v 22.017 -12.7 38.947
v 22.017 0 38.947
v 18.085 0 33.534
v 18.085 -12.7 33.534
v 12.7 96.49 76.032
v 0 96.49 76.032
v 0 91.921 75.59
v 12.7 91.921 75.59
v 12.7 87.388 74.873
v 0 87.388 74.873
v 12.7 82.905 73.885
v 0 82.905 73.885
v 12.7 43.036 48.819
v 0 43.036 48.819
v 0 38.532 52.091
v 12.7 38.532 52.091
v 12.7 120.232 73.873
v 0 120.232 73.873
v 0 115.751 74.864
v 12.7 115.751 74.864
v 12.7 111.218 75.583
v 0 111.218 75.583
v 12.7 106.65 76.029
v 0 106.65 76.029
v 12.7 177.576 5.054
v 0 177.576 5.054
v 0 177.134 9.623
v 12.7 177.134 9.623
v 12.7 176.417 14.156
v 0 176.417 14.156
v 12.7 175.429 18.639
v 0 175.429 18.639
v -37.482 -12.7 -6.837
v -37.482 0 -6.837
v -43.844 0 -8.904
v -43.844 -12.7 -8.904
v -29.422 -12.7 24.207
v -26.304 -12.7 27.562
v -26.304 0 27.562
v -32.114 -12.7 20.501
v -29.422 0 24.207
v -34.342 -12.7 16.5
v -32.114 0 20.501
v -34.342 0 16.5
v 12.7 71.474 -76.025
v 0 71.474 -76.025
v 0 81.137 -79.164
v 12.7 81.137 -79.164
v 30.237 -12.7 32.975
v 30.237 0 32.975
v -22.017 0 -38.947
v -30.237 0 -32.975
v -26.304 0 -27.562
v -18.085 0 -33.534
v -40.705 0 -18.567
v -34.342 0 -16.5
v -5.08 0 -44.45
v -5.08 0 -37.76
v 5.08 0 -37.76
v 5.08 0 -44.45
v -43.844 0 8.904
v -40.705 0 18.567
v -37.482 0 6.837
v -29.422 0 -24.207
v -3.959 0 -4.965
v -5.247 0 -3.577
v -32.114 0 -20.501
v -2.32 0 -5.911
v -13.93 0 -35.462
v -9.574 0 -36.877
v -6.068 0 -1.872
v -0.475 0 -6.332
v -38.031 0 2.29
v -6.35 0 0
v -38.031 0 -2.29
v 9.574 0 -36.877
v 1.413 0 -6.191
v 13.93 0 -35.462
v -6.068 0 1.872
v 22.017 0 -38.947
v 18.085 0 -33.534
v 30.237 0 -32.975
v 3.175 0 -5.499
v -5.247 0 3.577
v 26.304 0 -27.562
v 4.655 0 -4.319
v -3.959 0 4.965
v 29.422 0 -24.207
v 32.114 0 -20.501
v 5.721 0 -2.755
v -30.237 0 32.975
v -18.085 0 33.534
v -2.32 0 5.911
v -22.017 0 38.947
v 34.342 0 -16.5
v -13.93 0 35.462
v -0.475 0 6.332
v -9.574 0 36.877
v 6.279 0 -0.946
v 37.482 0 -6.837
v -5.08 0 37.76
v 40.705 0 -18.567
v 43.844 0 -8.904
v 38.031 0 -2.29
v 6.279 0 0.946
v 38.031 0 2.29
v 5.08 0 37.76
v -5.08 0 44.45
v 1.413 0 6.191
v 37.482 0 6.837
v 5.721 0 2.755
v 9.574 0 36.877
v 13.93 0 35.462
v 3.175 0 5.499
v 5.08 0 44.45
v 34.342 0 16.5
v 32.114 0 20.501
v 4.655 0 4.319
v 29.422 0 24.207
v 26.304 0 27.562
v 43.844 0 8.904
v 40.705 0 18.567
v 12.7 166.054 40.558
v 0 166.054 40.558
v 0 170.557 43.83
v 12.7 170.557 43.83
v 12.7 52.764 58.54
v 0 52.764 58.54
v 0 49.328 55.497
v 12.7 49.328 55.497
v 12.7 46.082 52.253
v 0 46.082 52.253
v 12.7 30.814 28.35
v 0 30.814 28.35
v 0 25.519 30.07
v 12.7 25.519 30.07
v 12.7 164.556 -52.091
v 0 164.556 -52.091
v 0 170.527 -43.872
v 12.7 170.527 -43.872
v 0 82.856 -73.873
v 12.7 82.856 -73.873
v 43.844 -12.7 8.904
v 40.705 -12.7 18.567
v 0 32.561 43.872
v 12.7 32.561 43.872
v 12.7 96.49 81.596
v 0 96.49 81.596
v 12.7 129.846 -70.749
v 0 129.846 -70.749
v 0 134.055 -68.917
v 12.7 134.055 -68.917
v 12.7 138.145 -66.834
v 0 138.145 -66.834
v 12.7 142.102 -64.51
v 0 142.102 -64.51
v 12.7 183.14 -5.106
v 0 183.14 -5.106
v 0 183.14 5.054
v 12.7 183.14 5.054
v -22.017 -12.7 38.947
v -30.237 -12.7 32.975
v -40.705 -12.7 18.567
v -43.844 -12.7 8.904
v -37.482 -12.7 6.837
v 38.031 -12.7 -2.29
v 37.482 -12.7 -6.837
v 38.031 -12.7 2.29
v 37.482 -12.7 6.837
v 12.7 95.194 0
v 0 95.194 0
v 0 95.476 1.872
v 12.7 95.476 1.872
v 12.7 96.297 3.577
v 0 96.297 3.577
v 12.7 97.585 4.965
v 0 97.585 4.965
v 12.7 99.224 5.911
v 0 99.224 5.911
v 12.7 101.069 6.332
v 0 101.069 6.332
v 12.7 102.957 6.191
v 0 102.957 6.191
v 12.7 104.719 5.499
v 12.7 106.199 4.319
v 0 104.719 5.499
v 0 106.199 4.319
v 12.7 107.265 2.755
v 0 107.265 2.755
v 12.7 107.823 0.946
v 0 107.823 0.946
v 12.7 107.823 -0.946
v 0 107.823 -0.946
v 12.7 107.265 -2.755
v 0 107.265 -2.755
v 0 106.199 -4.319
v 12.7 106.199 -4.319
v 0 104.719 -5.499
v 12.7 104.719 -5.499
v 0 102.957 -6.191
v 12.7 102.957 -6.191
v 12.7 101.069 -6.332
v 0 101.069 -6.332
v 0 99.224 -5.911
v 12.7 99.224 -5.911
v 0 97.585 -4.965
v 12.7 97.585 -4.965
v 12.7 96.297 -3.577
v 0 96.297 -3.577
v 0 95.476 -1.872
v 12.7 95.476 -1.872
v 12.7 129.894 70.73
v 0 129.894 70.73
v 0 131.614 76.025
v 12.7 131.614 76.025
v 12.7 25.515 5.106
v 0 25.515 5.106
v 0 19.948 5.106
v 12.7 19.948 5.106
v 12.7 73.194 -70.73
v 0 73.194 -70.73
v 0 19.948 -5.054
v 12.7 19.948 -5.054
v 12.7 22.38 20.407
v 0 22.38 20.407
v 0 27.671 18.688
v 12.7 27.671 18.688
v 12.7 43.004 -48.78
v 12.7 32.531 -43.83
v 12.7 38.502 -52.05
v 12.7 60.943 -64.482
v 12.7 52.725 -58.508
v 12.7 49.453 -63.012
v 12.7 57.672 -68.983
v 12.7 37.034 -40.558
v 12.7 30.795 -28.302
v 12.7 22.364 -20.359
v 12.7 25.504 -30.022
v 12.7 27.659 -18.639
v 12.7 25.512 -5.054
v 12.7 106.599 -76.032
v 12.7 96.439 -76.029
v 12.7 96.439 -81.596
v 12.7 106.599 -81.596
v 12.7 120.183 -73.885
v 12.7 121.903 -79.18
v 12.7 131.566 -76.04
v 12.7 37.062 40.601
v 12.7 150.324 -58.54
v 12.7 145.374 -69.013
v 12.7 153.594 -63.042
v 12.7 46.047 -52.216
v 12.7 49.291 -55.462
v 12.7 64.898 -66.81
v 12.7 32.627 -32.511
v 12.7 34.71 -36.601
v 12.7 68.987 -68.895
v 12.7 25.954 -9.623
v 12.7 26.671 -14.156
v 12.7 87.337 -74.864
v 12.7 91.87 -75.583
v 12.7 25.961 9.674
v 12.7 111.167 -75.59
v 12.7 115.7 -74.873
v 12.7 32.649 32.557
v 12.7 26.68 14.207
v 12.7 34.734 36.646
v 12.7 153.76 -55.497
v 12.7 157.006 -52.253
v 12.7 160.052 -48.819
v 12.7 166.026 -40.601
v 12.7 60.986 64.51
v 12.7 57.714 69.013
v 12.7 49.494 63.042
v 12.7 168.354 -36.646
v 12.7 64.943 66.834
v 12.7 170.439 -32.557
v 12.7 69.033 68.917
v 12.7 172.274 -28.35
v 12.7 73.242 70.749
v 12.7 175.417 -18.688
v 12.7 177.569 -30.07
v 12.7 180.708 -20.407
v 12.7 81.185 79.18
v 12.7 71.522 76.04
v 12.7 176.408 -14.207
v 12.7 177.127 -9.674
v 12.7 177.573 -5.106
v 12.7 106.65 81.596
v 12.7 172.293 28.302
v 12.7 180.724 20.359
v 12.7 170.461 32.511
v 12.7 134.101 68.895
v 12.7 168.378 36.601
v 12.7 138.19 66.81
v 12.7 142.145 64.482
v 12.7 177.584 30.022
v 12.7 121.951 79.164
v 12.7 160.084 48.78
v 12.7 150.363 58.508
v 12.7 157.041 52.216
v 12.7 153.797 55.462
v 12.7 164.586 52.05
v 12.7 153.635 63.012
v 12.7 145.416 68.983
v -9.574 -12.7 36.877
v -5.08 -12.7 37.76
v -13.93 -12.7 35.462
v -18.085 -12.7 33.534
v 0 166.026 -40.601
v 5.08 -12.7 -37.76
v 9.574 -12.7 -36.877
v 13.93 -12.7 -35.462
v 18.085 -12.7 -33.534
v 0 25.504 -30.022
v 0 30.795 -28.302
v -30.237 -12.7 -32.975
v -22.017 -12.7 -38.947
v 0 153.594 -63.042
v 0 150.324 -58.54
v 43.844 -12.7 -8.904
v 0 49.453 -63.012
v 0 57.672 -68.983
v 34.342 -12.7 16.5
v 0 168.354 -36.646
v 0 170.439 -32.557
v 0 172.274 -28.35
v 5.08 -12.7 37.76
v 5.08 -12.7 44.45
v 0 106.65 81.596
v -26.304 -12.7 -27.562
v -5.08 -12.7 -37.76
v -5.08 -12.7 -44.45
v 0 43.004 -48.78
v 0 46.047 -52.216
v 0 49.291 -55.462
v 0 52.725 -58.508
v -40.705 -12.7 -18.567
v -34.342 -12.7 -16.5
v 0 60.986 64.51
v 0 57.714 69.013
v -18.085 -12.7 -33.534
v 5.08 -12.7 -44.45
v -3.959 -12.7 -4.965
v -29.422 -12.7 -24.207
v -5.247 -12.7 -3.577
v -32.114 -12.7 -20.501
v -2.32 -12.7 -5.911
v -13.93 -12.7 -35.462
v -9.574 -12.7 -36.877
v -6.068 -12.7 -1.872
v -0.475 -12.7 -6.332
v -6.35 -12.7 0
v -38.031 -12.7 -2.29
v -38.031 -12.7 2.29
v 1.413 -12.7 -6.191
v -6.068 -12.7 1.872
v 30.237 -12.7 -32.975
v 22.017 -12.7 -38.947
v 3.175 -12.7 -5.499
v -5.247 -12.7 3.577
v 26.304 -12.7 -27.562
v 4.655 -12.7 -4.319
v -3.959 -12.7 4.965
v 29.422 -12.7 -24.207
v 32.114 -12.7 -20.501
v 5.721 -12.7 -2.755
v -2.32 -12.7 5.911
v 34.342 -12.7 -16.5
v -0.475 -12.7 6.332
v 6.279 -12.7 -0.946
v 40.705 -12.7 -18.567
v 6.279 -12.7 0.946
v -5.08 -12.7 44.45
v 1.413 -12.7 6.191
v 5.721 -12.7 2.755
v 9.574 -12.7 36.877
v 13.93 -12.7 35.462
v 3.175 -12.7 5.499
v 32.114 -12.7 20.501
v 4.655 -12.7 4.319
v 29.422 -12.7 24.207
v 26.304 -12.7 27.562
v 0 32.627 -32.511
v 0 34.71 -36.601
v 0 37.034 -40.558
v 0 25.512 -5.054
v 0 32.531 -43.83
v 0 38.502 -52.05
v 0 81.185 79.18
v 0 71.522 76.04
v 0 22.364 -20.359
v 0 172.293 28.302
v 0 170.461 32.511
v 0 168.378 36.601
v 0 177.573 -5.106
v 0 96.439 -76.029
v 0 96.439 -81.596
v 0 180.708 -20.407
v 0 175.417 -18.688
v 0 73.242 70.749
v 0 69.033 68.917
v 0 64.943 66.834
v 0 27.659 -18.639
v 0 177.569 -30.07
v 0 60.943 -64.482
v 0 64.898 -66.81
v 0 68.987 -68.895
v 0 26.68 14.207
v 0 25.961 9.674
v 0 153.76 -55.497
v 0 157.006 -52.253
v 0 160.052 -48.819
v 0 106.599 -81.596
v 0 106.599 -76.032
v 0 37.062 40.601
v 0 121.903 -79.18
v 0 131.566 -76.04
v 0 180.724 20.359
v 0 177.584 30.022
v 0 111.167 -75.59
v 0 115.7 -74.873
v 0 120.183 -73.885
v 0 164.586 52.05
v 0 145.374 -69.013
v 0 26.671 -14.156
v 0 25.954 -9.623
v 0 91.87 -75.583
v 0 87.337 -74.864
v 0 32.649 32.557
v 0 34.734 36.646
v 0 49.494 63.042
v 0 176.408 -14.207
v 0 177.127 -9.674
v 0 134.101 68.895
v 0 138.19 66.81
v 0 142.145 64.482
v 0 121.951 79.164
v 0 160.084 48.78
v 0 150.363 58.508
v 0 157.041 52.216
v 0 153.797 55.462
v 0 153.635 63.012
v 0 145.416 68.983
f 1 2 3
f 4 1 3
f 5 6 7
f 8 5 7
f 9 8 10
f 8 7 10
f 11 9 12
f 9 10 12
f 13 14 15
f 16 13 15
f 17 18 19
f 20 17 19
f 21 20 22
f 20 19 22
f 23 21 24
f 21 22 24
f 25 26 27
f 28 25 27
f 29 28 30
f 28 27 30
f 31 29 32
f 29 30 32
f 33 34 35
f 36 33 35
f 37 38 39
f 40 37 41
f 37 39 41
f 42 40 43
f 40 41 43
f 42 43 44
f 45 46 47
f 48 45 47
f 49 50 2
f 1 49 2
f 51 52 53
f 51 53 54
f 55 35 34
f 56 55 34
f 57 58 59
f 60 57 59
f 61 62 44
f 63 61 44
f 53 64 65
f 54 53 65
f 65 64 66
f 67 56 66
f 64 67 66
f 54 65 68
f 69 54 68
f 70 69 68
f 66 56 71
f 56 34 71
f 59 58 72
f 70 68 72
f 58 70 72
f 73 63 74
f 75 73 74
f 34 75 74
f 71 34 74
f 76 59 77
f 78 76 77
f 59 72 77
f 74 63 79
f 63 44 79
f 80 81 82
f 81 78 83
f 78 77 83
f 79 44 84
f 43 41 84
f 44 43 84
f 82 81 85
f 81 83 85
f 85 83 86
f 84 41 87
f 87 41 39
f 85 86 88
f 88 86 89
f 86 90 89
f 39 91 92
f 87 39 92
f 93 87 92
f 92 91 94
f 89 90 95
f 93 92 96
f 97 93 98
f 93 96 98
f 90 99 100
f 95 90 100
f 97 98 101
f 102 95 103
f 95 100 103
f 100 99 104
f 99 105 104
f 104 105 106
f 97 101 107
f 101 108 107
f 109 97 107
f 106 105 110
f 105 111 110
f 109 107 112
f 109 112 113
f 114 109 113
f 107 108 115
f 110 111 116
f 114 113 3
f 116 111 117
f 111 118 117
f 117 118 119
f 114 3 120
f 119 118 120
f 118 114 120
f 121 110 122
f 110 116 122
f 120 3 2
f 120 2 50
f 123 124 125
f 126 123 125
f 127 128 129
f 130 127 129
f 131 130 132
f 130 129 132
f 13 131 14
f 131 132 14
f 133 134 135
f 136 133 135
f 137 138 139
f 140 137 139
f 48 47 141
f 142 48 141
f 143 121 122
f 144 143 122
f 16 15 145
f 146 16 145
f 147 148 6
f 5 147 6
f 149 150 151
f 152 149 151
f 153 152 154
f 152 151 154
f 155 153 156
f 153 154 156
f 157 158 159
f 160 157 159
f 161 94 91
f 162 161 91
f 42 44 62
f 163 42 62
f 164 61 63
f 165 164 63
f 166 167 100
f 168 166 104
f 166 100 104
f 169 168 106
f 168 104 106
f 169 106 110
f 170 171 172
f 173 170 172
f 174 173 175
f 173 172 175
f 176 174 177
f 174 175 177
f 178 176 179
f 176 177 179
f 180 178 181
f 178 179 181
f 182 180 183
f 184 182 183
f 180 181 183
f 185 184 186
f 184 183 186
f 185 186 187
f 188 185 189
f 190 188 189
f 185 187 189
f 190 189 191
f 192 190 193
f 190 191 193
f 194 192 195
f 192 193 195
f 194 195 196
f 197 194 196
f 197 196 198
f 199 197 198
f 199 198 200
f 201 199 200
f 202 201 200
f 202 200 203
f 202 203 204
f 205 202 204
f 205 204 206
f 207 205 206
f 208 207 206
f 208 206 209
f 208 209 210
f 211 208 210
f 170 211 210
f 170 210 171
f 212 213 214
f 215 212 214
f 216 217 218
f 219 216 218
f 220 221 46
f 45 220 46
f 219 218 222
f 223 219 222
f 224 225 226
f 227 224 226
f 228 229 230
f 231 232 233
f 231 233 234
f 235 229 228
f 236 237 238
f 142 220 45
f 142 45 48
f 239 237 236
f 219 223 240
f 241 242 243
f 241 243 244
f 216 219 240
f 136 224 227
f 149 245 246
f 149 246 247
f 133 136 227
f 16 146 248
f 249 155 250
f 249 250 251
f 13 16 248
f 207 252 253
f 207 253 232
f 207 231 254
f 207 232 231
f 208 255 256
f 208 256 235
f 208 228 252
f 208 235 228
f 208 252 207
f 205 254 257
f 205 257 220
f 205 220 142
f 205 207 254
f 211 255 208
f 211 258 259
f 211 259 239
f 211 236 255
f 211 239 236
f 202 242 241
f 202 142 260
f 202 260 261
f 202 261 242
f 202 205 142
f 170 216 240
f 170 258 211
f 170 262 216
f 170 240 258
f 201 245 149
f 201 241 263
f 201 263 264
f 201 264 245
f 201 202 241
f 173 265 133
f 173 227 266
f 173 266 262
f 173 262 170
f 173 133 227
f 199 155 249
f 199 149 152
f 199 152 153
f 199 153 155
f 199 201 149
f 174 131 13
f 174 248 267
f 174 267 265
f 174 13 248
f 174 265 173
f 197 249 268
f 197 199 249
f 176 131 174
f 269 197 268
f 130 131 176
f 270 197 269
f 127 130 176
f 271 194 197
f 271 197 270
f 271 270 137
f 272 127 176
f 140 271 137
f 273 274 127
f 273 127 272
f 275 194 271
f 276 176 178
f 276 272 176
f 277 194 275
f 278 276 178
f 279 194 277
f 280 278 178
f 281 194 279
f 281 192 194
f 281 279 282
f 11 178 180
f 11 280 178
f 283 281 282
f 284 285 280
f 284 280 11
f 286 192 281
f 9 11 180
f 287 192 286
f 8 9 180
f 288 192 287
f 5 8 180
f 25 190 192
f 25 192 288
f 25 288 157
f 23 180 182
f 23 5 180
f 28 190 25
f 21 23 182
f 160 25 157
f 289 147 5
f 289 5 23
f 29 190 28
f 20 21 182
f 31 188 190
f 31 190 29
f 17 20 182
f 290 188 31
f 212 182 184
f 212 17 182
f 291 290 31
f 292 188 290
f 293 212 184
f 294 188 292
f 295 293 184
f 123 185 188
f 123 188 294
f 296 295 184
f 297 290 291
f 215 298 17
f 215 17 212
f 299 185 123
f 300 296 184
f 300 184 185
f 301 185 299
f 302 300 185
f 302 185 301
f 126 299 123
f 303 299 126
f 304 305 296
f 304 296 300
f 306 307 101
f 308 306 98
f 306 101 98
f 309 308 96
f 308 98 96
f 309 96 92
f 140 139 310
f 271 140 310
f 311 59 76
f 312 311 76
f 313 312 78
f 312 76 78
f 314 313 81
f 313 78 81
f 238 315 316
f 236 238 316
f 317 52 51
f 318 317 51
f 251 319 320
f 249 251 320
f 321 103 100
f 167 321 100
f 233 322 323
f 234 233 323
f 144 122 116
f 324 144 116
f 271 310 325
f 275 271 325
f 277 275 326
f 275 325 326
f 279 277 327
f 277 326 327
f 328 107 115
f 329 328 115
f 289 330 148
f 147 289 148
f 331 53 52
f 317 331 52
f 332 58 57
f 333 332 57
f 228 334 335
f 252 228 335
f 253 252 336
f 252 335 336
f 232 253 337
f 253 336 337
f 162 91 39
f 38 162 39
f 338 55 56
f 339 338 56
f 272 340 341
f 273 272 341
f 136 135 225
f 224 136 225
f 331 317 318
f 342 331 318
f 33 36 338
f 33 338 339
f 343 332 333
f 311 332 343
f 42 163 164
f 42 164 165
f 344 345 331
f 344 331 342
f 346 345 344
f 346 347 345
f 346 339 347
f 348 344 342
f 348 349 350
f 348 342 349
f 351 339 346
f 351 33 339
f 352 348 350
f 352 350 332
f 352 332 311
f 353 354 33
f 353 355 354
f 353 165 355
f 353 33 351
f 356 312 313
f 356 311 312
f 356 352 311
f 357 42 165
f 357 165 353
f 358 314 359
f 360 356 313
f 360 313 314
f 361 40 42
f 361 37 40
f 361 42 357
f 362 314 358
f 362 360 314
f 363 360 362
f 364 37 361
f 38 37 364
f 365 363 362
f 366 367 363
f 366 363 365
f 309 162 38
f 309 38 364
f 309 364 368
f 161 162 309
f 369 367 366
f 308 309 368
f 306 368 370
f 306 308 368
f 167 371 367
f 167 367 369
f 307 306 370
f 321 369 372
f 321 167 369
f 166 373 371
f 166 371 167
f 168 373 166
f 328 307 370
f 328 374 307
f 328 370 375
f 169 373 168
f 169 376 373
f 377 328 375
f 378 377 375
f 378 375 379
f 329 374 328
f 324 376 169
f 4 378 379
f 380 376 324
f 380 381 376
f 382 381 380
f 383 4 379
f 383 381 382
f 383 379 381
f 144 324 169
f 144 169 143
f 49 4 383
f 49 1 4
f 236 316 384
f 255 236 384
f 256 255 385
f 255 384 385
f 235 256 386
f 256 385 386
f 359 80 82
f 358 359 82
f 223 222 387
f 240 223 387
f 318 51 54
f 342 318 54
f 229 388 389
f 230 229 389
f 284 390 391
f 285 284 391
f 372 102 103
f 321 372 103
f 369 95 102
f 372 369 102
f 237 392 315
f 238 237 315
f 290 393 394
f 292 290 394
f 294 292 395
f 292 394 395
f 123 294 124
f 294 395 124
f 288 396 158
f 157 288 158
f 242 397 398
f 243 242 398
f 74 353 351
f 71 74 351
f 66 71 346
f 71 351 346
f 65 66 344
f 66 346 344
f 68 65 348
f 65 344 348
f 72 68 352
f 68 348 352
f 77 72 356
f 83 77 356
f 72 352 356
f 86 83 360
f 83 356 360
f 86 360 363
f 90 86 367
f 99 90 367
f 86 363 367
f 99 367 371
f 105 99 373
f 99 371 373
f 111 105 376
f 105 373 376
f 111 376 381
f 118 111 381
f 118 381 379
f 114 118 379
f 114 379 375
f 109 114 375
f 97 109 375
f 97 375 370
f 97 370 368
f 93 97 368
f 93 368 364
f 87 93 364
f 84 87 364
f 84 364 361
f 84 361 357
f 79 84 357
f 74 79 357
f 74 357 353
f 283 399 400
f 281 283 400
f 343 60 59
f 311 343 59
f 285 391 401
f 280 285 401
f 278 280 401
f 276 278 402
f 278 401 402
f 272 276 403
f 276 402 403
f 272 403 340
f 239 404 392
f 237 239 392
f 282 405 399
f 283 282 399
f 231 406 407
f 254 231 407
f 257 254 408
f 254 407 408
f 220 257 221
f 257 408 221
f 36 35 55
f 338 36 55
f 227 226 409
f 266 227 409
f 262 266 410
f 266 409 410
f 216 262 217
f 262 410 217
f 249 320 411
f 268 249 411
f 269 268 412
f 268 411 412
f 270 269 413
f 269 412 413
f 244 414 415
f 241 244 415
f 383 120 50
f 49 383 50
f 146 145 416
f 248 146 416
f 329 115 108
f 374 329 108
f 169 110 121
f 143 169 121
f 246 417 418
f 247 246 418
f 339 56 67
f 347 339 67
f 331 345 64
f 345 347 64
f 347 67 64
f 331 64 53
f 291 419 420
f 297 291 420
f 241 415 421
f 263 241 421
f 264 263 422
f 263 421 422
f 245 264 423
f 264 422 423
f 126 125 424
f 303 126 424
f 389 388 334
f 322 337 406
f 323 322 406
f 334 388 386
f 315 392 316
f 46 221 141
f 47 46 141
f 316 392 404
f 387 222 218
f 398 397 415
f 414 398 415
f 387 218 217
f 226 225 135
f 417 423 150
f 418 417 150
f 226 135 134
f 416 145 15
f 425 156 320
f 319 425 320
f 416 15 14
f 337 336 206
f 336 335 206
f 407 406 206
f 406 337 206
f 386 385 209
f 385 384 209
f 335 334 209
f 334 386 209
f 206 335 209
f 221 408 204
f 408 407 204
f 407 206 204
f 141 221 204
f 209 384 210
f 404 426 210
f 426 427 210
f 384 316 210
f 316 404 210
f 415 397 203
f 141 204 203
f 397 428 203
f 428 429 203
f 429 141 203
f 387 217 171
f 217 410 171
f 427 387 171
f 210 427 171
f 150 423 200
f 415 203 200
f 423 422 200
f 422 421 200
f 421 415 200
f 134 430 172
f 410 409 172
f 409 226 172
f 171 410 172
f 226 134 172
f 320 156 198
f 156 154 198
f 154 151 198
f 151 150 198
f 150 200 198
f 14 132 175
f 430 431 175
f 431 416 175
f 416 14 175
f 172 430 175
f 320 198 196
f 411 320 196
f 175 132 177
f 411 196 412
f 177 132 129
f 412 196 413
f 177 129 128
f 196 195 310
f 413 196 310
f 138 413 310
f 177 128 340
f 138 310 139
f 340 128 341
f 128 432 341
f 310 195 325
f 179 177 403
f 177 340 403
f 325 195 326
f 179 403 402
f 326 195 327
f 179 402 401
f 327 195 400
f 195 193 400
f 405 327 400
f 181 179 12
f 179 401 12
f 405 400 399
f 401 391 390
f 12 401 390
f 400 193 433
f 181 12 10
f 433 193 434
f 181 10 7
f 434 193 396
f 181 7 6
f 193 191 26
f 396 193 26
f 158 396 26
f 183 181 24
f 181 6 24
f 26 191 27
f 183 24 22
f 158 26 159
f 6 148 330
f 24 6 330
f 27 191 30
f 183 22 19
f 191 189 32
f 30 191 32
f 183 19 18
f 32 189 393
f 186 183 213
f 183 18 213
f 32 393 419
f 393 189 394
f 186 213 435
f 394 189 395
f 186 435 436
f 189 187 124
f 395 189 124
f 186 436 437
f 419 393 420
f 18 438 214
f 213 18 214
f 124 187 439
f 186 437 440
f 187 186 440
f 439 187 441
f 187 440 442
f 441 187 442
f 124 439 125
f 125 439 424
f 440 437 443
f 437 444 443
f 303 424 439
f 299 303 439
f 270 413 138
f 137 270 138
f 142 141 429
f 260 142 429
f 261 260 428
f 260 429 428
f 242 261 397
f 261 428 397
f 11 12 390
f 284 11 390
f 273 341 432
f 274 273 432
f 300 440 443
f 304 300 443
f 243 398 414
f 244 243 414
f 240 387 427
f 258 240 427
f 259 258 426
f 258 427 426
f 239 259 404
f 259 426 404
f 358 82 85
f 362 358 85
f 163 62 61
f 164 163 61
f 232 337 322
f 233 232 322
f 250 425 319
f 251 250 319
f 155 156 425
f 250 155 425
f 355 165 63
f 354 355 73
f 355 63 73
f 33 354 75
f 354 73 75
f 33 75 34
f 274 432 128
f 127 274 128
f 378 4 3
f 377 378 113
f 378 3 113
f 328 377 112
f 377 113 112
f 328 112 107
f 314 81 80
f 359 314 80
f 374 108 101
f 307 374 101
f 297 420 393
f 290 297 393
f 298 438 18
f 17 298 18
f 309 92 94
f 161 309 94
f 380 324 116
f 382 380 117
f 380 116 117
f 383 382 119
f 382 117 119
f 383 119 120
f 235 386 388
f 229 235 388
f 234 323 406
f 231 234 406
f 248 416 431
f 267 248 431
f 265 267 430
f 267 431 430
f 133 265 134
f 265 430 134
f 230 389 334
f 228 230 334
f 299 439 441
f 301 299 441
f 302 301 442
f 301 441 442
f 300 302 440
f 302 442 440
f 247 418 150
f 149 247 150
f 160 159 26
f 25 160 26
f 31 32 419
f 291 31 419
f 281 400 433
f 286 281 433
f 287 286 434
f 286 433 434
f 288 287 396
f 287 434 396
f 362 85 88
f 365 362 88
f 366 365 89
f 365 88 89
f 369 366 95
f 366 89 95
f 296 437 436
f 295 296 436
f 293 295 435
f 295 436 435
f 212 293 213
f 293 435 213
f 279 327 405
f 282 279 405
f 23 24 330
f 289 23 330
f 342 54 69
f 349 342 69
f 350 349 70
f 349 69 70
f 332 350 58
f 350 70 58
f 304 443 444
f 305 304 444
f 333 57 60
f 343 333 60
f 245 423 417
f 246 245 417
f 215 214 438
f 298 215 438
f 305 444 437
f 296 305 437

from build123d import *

# Parameters (mm, degrees)
F0_R     = 38.1
F2_DEPTH = 12.7
F3_COUNT = 10
F4_D     = 12.7
F5_R     = 76.2
F7_DEPTH = 12.7
F8_COUNT = 20
F11_D    = 12.7


with BuildPart() as f2:
    # F0 (on Front) + F1 (on face) → F2 (new body)
    with BuildSketch(Plane.XZ):
        Circle(F0_R)
    with BuildSketch(Plane.XZ):
        with BuildLine():
            Line((-5.08, 44.45), (-5.08, 37.7598146182))
            ThreePointArc((-5.08, 37.7598146182), (0, 38.1), (5.08, 37.7598146182))
            Line((5.08, 37.7598146182), (5.08, 44.45))
            Line((5.08, 44.45), (-5.08, 44.45))
        make_face()
    extrude(amount=F2_DEPTH)

    # F3: F2 ×10 about axis
    f3_axis = Axis((0, 0, 0), (0, -1, 0))


with BuildPart() as f2_1:
    add(f2.part)
    for i in range(1, F3_COUNT):
        add(f2.part.rotate(f3_axis, i * 360 / F3_COUNT))

    # F4 (through all)
    with Locations(Plane(origin=(0, 0, 0), x_dir=(1, 0, 0), z_dir=(0, 1, 0))):
        with Locations((0, 0)):
            Hole(F4_D / 2)


with BuildPart() as f7:
    # F5 (on Right) + F6 (on face) → F7 (new body)
    with BuildSketch(Plane.YZ):
        with Locations((101.5440017082, 0)):
            Circle(F5_R)
    with BuildSketch(Plane.YZ):
        with BuildLine():
            Line((96.4895019979, 81.5958976746), (96.4895019979, 76.0321776137))
            ThreePointArc((96.4895019979, 76.0321776137), (101.5695588549, 76.1999957141), (106.6495019979, 76.0287699939))
            Line((106.6495019979, 76.0287699939), (106.6495019979, 81.5958976746))
            Line((106.6495019979, 81.5958976746), (96.4895019979, 81.5958976746))
        make_face()
    extrude(amount=F7_DEPTH)

    # F8: F7 ×20 about axis
    f8_axis = Axis((12.7, 101.5440017082, 0), (1, 0, 0))


with BuildPart() as f7_1:
    add(f7.part)
    for i in range(1, F8_COUNT):
        add(f7.part.rotate(f8_axis, i * 360 / F8_COUNT))

    # F9: union 

    # F11 (through all)
    with Locations(Plane.YZ.offset(12.7)):
        with Locations((101.5440017082, 0)):
            Hole(F11_D / 2)


solid = Compound([f2_1.part, f7_1.part])
